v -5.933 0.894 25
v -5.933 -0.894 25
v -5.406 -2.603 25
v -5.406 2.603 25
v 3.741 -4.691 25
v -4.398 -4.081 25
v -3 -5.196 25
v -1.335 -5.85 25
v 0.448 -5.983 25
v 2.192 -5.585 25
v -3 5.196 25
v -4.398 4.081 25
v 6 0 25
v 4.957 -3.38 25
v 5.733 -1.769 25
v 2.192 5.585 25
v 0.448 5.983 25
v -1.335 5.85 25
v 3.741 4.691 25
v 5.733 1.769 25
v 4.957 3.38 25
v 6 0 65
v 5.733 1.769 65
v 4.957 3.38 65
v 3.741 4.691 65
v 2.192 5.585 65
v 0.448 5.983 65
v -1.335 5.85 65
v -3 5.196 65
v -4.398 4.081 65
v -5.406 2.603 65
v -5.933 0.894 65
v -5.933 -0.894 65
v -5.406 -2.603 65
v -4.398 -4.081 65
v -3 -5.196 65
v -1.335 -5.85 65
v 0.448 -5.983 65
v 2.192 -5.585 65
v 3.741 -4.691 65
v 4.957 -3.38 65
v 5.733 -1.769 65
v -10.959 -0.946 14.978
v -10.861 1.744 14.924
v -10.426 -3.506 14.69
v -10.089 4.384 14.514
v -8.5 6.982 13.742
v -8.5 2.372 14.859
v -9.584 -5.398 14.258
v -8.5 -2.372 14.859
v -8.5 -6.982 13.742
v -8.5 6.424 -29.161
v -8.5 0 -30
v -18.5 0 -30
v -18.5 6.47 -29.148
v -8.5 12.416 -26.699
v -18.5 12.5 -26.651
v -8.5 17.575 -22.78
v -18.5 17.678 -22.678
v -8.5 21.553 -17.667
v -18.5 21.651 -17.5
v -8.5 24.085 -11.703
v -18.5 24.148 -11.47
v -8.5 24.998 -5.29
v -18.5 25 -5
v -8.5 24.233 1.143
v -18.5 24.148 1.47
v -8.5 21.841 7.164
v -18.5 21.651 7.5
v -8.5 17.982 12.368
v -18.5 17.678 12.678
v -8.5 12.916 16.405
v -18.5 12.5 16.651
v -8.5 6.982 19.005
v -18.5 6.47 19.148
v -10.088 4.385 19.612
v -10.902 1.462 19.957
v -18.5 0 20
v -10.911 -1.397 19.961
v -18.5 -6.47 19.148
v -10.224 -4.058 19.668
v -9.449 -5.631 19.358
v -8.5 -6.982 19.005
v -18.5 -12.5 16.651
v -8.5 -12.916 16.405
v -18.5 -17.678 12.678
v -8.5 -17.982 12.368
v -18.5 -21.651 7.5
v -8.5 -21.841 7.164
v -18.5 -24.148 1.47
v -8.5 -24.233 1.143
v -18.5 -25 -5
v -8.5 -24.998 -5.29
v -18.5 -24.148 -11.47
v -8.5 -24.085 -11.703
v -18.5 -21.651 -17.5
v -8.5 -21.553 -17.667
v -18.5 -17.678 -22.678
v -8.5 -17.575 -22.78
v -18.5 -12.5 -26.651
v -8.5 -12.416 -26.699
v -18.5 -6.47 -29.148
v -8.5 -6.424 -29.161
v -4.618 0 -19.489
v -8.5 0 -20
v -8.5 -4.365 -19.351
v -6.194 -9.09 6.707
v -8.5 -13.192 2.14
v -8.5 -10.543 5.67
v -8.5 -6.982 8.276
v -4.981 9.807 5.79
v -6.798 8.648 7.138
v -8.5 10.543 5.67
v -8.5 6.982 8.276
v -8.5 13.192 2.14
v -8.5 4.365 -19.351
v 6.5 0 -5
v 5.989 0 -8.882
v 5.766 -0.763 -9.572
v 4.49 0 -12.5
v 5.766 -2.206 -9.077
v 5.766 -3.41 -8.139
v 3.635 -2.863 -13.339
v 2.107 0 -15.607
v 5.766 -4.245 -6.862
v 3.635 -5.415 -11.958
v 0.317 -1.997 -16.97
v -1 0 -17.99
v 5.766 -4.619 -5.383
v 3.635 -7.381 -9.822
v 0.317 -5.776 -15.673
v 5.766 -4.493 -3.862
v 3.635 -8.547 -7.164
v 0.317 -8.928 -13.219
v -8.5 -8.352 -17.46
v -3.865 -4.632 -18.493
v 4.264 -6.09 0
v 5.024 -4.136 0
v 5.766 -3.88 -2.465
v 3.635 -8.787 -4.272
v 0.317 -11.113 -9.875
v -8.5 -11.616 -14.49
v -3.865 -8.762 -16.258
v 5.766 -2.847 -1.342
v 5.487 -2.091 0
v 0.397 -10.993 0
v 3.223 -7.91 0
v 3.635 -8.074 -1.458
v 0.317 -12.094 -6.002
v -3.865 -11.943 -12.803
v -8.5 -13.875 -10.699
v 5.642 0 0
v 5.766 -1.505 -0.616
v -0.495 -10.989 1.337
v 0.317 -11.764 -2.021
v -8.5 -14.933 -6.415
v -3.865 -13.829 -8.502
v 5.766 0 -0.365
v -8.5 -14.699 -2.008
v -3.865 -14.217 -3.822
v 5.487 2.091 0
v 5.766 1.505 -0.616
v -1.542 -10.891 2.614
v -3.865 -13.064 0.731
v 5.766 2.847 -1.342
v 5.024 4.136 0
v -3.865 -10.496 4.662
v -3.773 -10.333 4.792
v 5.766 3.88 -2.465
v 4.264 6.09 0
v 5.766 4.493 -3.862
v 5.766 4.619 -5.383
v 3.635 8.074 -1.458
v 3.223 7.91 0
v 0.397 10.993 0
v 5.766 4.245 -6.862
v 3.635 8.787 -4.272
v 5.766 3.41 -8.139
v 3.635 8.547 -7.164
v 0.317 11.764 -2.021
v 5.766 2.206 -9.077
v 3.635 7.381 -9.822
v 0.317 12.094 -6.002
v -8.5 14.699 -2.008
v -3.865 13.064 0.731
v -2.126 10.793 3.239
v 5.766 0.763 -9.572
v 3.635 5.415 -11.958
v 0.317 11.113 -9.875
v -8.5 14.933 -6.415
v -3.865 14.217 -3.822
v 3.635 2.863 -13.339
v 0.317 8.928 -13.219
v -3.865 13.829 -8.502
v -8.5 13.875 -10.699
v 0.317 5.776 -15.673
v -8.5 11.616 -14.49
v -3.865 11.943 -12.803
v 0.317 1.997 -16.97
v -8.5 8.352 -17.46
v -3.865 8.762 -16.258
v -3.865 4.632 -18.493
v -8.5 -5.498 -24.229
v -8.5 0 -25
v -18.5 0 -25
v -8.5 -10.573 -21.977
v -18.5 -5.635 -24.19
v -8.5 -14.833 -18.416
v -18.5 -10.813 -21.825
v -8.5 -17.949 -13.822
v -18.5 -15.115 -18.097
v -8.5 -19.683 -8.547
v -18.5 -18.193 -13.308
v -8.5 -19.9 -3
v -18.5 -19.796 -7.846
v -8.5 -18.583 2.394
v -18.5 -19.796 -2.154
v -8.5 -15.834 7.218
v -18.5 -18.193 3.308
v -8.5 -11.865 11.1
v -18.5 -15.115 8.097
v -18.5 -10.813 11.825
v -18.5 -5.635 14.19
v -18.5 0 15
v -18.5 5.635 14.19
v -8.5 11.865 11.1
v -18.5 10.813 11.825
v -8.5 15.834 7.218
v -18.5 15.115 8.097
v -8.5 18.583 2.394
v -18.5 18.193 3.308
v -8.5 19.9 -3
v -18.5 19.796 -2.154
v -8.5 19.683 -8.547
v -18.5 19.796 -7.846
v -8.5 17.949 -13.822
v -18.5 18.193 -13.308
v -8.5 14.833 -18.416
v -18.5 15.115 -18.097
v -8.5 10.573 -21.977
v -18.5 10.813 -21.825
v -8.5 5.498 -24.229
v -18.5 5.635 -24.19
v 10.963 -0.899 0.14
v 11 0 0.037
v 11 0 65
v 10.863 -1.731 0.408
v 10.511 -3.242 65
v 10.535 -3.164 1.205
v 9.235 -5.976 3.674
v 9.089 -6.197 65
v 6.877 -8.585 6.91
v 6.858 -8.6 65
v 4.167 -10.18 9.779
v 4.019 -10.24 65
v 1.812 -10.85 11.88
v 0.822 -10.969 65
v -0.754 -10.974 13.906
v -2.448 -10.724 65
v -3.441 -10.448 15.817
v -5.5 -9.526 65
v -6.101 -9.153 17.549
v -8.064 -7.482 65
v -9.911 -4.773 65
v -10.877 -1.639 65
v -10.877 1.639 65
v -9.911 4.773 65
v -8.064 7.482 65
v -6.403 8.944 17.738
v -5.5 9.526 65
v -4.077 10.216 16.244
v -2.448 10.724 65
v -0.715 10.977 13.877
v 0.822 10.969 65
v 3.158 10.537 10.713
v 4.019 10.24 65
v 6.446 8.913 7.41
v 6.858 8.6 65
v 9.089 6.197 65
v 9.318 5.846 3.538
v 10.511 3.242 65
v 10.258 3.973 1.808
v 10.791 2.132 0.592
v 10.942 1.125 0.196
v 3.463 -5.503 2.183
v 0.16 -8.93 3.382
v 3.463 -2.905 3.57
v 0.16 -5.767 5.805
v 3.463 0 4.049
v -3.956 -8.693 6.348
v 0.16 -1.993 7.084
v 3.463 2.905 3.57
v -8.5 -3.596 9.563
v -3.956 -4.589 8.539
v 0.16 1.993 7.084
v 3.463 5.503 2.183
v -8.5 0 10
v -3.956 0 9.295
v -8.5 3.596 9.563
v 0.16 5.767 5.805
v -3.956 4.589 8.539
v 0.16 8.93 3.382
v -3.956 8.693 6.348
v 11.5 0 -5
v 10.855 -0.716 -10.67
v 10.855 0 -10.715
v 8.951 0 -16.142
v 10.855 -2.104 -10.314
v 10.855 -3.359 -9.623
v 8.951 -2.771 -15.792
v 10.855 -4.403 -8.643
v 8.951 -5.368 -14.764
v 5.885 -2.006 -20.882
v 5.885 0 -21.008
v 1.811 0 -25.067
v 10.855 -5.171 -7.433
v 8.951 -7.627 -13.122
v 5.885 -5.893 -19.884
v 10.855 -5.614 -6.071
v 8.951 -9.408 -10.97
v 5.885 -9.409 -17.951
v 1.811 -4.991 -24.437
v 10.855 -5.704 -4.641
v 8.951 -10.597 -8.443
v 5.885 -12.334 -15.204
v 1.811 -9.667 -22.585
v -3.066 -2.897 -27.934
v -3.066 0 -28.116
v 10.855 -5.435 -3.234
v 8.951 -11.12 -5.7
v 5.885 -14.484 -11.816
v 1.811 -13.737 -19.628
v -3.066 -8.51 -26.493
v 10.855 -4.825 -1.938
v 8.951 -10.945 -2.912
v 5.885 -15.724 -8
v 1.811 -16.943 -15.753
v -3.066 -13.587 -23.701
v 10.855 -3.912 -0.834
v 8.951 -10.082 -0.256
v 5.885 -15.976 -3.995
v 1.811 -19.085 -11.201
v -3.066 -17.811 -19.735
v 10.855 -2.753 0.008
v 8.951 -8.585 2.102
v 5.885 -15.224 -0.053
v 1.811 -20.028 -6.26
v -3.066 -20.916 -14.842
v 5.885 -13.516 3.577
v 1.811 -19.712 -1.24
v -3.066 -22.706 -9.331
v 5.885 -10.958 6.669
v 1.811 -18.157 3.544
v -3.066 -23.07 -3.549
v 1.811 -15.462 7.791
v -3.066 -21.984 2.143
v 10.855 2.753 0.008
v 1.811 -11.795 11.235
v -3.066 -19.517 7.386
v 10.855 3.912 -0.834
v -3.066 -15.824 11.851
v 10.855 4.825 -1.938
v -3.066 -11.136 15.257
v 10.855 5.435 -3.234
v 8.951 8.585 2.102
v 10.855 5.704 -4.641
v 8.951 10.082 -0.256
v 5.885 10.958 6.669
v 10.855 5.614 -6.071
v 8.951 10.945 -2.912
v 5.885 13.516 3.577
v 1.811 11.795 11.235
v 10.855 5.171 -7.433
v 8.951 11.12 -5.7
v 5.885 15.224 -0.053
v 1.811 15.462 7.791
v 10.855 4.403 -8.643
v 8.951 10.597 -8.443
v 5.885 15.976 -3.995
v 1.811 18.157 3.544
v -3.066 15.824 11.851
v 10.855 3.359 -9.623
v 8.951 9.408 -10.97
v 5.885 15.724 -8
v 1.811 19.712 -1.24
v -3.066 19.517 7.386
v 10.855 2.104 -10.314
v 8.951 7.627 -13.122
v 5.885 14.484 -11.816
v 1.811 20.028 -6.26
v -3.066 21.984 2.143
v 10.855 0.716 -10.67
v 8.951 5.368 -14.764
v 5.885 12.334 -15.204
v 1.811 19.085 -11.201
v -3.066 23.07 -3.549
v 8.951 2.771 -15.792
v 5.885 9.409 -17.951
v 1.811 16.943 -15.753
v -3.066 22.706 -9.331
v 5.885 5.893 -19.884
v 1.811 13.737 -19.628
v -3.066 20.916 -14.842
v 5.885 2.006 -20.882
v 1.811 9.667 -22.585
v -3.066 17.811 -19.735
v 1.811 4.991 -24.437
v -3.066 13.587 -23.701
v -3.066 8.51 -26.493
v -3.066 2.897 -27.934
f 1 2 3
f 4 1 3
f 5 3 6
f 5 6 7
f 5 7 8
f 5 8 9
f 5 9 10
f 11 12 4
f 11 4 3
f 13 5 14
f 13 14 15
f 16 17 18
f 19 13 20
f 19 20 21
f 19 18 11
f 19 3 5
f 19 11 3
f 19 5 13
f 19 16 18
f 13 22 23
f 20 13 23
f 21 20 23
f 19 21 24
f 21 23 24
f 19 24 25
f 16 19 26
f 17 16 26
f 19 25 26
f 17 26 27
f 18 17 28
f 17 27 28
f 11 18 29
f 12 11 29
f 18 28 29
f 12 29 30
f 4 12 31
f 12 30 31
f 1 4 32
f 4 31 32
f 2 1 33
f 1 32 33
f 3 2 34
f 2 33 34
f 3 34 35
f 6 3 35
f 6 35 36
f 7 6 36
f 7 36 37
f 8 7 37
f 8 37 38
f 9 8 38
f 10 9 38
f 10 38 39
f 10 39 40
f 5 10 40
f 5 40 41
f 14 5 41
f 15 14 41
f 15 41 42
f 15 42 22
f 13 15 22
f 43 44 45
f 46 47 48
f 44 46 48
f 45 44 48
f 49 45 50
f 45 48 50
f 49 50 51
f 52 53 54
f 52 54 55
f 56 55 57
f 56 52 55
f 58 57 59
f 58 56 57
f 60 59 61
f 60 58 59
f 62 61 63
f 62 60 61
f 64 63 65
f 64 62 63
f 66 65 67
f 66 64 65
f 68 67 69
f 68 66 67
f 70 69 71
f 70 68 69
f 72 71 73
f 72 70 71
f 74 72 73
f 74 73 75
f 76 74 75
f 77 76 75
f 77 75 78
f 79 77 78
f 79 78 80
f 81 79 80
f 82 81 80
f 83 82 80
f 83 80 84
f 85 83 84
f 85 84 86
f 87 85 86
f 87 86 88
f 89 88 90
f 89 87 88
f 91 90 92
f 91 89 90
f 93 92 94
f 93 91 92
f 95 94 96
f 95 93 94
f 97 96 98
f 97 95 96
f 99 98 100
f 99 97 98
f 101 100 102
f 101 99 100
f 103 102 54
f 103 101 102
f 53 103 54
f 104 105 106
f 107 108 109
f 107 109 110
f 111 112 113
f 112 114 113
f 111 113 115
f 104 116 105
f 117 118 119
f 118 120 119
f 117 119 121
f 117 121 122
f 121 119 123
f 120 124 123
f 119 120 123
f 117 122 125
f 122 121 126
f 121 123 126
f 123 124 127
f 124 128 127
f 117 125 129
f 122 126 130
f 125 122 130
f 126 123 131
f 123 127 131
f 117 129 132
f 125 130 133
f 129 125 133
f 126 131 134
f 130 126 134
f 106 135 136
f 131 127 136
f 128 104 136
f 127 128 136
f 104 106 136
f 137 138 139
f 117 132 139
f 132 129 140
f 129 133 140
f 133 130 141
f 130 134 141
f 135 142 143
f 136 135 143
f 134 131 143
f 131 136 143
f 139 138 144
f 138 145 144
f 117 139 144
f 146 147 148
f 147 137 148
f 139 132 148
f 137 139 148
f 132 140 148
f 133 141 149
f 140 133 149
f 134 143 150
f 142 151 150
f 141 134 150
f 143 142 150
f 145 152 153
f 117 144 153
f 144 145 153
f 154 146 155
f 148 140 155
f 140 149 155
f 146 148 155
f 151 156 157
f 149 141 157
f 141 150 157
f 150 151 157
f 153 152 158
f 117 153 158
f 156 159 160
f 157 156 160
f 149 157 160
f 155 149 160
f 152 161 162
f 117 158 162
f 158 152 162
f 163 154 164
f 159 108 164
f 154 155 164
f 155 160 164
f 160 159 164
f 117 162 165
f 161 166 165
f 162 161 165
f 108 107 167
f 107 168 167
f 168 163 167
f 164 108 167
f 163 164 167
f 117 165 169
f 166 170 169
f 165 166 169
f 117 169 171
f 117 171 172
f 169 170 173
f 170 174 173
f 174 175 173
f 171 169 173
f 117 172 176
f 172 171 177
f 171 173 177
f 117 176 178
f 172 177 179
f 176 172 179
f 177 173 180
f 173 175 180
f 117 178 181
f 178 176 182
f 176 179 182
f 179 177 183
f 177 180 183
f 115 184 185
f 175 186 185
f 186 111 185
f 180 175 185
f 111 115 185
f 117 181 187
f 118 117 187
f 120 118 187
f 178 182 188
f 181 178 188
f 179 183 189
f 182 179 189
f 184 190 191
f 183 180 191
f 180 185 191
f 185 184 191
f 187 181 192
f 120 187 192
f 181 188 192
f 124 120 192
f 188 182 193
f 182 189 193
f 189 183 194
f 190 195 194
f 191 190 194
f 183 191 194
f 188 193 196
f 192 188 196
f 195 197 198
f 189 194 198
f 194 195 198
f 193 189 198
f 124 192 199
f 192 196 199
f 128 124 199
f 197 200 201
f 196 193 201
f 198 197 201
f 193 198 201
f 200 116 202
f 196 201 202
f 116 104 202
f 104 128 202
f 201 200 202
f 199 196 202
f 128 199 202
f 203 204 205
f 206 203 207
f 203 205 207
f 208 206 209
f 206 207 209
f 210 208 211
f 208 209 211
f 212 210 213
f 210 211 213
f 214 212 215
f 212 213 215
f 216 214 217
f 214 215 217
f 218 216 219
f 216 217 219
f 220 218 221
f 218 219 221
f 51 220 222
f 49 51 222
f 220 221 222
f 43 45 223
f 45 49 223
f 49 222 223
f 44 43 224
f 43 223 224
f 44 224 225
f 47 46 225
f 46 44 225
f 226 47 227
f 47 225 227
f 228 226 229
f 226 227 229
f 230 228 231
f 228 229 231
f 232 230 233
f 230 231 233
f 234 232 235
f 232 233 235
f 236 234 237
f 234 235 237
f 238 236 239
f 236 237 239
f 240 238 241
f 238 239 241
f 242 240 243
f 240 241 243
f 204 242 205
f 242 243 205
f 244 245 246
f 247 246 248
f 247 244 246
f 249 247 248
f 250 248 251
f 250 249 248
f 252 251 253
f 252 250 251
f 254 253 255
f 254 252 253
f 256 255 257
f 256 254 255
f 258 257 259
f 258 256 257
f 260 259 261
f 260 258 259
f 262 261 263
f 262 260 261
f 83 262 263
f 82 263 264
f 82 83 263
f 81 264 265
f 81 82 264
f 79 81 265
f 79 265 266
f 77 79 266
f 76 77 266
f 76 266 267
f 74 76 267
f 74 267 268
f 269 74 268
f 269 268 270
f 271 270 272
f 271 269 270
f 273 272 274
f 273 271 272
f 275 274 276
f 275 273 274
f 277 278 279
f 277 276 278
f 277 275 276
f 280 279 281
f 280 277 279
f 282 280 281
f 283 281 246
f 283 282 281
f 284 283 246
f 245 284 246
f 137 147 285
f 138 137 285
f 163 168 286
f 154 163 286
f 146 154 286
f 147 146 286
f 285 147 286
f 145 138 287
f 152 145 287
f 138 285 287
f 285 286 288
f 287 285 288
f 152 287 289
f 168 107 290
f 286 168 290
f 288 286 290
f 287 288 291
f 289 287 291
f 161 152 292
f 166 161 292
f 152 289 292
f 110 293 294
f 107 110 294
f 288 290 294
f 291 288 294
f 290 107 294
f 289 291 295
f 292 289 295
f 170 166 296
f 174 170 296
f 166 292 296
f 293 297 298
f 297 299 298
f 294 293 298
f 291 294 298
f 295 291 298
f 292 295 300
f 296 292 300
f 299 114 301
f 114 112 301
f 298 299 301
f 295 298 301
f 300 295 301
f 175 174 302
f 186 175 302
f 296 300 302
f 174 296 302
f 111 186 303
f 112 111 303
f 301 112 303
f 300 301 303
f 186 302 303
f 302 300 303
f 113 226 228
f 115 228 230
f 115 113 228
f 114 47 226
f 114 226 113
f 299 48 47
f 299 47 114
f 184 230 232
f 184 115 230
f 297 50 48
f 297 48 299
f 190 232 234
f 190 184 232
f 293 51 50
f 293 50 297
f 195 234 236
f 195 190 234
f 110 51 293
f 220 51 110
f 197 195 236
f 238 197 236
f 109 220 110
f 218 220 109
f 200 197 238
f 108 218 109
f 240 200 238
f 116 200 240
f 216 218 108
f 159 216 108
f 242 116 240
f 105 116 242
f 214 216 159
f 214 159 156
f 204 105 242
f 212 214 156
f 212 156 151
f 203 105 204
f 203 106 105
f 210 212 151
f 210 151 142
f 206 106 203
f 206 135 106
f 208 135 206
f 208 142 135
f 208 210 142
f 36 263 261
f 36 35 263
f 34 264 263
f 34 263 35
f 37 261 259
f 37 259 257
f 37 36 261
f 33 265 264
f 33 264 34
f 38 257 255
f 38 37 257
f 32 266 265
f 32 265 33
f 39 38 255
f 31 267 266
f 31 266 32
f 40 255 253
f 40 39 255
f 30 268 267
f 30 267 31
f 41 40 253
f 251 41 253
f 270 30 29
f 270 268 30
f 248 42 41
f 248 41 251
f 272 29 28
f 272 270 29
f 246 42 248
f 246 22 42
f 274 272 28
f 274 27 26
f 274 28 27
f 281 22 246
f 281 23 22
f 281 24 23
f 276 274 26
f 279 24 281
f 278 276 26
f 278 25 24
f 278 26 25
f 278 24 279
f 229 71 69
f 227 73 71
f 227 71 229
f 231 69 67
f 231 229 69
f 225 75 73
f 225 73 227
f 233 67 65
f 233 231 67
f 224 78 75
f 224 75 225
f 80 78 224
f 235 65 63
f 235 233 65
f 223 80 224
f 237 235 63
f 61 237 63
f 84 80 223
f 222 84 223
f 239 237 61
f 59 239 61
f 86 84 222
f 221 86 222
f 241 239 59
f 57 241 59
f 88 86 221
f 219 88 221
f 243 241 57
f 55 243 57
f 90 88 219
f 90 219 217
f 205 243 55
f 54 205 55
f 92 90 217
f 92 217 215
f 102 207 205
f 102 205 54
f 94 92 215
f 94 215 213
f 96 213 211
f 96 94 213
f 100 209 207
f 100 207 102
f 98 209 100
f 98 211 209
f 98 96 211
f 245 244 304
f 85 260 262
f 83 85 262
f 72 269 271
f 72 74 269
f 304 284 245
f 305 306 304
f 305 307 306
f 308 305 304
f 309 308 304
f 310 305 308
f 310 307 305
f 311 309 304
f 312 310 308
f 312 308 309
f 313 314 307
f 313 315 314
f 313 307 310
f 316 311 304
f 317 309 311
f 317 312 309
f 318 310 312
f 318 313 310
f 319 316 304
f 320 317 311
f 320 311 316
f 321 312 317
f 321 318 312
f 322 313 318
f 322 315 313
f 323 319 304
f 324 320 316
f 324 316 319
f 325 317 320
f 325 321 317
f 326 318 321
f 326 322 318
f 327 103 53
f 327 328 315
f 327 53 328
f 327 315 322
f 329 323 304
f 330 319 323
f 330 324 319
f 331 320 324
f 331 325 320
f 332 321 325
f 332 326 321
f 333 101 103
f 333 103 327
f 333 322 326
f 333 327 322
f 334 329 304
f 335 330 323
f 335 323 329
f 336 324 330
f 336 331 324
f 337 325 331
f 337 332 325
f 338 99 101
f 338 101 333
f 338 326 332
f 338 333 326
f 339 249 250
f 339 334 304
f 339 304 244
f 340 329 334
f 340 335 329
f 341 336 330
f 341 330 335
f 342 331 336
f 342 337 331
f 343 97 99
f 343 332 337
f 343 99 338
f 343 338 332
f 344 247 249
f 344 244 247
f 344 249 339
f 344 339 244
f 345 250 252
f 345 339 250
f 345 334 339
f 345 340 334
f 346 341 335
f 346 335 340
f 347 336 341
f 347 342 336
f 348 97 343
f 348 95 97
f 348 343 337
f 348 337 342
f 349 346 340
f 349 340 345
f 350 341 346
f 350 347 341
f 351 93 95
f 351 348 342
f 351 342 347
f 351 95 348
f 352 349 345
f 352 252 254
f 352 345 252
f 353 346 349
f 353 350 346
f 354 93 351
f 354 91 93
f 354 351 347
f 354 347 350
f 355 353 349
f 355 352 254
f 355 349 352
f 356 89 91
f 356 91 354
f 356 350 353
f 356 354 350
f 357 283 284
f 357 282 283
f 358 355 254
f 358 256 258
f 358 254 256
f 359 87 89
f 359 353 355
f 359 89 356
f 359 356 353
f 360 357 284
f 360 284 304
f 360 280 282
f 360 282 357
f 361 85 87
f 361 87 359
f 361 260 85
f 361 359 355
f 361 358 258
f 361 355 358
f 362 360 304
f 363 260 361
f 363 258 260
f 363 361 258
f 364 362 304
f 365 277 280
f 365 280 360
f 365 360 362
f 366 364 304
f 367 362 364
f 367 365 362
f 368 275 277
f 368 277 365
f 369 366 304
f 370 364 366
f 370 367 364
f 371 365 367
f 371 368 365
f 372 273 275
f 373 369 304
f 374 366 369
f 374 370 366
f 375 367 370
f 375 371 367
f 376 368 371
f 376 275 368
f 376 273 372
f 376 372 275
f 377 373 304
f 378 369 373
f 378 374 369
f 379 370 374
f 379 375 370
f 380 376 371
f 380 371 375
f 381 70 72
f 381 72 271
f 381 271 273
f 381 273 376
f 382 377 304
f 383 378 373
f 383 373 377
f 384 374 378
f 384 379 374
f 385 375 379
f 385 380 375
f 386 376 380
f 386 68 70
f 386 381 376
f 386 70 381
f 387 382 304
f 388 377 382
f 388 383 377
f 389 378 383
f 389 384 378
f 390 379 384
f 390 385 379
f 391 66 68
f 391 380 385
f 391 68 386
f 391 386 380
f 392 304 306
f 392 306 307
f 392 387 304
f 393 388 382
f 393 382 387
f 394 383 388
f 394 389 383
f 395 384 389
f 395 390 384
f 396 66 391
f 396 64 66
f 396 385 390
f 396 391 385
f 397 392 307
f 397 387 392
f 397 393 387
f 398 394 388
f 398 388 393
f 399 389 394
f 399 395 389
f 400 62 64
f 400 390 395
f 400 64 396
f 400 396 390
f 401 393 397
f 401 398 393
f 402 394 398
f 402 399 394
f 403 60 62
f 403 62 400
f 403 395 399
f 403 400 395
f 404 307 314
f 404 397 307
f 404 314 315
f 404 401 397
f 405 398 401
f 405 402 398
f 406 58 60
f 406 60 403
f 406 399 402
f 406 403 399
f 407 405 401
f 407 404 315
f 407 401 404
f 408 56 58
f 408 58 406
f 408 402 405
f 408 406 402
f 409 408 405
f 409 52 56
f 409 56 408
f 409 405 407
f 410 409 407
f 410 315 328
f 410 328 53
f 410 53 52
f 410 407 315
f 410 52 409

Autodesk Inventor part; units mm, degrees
ref_plane "YZ Plane" through (0, 0, 0) normal (1, 0, 0) x (0, 1, 0)
ref_plane "XZ Plane" through (0, 0, 0) normal (0, 1, 0) x (-1, 0, 0)
ref_plane "XY Plane" through (0, 0, 0) normal (0, 0, 1) x (1, 0, 0)
sketch "Sketch2" plane through (0, 0, 0) normal (0, 0, 1) x (1, 0, 0)
  circle A0 centre (0, 0) radius 11
  dimension "d1" = 22
extrude "Extrusion1" add sketch "Sketch2" along normal blind 65
sketch "Sketch3" plane through (0, 0, 65) normal (0, 0, 1) x (1, 0, 0)
  circle A0 centre (0, 0) radius 6
  dimension "d4" = 12
extrude "Extrusion2" cut sketch "Sketch3" against normal blind 40
thread "Thread1" size "M12x1.25" class "6H" standard "ISO Metric profile" full length
sketch "Sketch6" plane through (0, 0, 0) normal (0, 1, 0) x (-1, 0, 0)
  line L0 (11, 65) -> (-11, 65) construction
  line L1 (-11.5, -5) -> (56.1068, -5) construction
  line L2 (0, 0) -> (0, -163.2122) construction
  line L3 (8.5, -107.4374) -> (8.5, -5) construction
  line L4 (18.5, -103.8042) -> (18.5, -5) construction
  circle A0 centre (8.5, -5) radius 15
  line L5 (-11.5, -59.4325) -> (-11.5, -5) construction
  circle A1 centre (8.5, -5) radius 20 construction
  line L6 (18.5, -30) -> (18.5, 20) construction
  line L7 (18.5, -30) -> (-11.5, -18.9445) construction
  line L8 (22.2477, -5) -> (22.2477, -11) construction
  line L9 (22.2477, -11) -> (58.2477, -11)
  line L10 (58.2477, -11) -> (58.2477, -5)
  line L11 (23.5, -5) -> (58.2477, -5)
  line L12 (18.5, -30) -> (-11.5, -30) construction
  line L13 (18.5, -25) -> (-11.5, -25) construction
  line L14 (8.5, -20) -> (8.5, -25)
  line L15 (8.5, -25) -> (18.5, -25)
  line L16 (18.5, -25) -> (18.5, -30)
  line L17 (18.5, -30) -> (0, -30)
  arc A2 (-11.5, -5) -> (8.5, -30) centre (14.125, -5) ccw
  line L18 (-11.5, -5) -> (-6.5, -5)
  line L19 (23.5, -5) -> (-6.5, -5)
  point P0 (18.5, -5)
  dimension "d27" = 70
  dimension "d28" = 8.5
  dimension "d30" = 30
  dimension "d31" = 30
  dimension "d32" = 5
  dimension "d33" = 50
  dimension "d34" = 6
  dimension "d35" = 36
  dimension "d36" = 5
  dimension "d37" = 10
revolve "Revolution2" add sketch "Sketch6" angle 360 about axis through (11.5, 0, -5) along (-1, 0, 0) contours A0 L14 L15 L16 L17 A2 L18
sketch "Sketch7" plane through (0, 0, 0) normal (0, 1, 0) x (-1, 0, 0)
  line L0 (23.5, -5) -> (-6.5, -5) projected
  line L1 (18.5, -30) -> (18.5, 20) construction
  line L2 (18.5, -25) -> (-11.5, -25) construction
  line L3 (8.5, -107.4374) -> (8.5, -5) construction
  line L4 (18.5, -5) -> (18.5, -25)
  line L5 (8.5, -25) -> (8.5, -5)
  line L6 (8.5, -5) -> (18.5, -5)
  line L7 (18.5, -25) -> (8.5, -25)
  point P0 (0, 0)
thread "Thread2" size "M40x1.5" class "6H" standard "ISO Metric profile" full length
revolve "Revolution6" cut sketch "Sketch6" angle 360 about axis through (11.5, 0, -5) along (-1, 0, 0) picked at (6.409, -11.3012) contours A0 L19
revolve "Revolution7" cut sketch "Sketch7" angle 360 about axis through (-23.5, 0, -5) along (1, 0, 0)
equation "\"d4\" = Screw_DIA"
equation "\"d5\" = ScrewDEPTH"
equation "\"d16\" = 55deg"
equation "\"Sketch4_Pitch\" = 1.25"
equation "\"d50\" = 55deg"
equation "\"Sketch8_Pitch\" = 1.5"
equation "\"Screw_DIA\" = 12"
equation "\"ScrewDEPTH\" = 40"
properties part number "MCEN4000:T4" material "STEEL, AISI 1040"
